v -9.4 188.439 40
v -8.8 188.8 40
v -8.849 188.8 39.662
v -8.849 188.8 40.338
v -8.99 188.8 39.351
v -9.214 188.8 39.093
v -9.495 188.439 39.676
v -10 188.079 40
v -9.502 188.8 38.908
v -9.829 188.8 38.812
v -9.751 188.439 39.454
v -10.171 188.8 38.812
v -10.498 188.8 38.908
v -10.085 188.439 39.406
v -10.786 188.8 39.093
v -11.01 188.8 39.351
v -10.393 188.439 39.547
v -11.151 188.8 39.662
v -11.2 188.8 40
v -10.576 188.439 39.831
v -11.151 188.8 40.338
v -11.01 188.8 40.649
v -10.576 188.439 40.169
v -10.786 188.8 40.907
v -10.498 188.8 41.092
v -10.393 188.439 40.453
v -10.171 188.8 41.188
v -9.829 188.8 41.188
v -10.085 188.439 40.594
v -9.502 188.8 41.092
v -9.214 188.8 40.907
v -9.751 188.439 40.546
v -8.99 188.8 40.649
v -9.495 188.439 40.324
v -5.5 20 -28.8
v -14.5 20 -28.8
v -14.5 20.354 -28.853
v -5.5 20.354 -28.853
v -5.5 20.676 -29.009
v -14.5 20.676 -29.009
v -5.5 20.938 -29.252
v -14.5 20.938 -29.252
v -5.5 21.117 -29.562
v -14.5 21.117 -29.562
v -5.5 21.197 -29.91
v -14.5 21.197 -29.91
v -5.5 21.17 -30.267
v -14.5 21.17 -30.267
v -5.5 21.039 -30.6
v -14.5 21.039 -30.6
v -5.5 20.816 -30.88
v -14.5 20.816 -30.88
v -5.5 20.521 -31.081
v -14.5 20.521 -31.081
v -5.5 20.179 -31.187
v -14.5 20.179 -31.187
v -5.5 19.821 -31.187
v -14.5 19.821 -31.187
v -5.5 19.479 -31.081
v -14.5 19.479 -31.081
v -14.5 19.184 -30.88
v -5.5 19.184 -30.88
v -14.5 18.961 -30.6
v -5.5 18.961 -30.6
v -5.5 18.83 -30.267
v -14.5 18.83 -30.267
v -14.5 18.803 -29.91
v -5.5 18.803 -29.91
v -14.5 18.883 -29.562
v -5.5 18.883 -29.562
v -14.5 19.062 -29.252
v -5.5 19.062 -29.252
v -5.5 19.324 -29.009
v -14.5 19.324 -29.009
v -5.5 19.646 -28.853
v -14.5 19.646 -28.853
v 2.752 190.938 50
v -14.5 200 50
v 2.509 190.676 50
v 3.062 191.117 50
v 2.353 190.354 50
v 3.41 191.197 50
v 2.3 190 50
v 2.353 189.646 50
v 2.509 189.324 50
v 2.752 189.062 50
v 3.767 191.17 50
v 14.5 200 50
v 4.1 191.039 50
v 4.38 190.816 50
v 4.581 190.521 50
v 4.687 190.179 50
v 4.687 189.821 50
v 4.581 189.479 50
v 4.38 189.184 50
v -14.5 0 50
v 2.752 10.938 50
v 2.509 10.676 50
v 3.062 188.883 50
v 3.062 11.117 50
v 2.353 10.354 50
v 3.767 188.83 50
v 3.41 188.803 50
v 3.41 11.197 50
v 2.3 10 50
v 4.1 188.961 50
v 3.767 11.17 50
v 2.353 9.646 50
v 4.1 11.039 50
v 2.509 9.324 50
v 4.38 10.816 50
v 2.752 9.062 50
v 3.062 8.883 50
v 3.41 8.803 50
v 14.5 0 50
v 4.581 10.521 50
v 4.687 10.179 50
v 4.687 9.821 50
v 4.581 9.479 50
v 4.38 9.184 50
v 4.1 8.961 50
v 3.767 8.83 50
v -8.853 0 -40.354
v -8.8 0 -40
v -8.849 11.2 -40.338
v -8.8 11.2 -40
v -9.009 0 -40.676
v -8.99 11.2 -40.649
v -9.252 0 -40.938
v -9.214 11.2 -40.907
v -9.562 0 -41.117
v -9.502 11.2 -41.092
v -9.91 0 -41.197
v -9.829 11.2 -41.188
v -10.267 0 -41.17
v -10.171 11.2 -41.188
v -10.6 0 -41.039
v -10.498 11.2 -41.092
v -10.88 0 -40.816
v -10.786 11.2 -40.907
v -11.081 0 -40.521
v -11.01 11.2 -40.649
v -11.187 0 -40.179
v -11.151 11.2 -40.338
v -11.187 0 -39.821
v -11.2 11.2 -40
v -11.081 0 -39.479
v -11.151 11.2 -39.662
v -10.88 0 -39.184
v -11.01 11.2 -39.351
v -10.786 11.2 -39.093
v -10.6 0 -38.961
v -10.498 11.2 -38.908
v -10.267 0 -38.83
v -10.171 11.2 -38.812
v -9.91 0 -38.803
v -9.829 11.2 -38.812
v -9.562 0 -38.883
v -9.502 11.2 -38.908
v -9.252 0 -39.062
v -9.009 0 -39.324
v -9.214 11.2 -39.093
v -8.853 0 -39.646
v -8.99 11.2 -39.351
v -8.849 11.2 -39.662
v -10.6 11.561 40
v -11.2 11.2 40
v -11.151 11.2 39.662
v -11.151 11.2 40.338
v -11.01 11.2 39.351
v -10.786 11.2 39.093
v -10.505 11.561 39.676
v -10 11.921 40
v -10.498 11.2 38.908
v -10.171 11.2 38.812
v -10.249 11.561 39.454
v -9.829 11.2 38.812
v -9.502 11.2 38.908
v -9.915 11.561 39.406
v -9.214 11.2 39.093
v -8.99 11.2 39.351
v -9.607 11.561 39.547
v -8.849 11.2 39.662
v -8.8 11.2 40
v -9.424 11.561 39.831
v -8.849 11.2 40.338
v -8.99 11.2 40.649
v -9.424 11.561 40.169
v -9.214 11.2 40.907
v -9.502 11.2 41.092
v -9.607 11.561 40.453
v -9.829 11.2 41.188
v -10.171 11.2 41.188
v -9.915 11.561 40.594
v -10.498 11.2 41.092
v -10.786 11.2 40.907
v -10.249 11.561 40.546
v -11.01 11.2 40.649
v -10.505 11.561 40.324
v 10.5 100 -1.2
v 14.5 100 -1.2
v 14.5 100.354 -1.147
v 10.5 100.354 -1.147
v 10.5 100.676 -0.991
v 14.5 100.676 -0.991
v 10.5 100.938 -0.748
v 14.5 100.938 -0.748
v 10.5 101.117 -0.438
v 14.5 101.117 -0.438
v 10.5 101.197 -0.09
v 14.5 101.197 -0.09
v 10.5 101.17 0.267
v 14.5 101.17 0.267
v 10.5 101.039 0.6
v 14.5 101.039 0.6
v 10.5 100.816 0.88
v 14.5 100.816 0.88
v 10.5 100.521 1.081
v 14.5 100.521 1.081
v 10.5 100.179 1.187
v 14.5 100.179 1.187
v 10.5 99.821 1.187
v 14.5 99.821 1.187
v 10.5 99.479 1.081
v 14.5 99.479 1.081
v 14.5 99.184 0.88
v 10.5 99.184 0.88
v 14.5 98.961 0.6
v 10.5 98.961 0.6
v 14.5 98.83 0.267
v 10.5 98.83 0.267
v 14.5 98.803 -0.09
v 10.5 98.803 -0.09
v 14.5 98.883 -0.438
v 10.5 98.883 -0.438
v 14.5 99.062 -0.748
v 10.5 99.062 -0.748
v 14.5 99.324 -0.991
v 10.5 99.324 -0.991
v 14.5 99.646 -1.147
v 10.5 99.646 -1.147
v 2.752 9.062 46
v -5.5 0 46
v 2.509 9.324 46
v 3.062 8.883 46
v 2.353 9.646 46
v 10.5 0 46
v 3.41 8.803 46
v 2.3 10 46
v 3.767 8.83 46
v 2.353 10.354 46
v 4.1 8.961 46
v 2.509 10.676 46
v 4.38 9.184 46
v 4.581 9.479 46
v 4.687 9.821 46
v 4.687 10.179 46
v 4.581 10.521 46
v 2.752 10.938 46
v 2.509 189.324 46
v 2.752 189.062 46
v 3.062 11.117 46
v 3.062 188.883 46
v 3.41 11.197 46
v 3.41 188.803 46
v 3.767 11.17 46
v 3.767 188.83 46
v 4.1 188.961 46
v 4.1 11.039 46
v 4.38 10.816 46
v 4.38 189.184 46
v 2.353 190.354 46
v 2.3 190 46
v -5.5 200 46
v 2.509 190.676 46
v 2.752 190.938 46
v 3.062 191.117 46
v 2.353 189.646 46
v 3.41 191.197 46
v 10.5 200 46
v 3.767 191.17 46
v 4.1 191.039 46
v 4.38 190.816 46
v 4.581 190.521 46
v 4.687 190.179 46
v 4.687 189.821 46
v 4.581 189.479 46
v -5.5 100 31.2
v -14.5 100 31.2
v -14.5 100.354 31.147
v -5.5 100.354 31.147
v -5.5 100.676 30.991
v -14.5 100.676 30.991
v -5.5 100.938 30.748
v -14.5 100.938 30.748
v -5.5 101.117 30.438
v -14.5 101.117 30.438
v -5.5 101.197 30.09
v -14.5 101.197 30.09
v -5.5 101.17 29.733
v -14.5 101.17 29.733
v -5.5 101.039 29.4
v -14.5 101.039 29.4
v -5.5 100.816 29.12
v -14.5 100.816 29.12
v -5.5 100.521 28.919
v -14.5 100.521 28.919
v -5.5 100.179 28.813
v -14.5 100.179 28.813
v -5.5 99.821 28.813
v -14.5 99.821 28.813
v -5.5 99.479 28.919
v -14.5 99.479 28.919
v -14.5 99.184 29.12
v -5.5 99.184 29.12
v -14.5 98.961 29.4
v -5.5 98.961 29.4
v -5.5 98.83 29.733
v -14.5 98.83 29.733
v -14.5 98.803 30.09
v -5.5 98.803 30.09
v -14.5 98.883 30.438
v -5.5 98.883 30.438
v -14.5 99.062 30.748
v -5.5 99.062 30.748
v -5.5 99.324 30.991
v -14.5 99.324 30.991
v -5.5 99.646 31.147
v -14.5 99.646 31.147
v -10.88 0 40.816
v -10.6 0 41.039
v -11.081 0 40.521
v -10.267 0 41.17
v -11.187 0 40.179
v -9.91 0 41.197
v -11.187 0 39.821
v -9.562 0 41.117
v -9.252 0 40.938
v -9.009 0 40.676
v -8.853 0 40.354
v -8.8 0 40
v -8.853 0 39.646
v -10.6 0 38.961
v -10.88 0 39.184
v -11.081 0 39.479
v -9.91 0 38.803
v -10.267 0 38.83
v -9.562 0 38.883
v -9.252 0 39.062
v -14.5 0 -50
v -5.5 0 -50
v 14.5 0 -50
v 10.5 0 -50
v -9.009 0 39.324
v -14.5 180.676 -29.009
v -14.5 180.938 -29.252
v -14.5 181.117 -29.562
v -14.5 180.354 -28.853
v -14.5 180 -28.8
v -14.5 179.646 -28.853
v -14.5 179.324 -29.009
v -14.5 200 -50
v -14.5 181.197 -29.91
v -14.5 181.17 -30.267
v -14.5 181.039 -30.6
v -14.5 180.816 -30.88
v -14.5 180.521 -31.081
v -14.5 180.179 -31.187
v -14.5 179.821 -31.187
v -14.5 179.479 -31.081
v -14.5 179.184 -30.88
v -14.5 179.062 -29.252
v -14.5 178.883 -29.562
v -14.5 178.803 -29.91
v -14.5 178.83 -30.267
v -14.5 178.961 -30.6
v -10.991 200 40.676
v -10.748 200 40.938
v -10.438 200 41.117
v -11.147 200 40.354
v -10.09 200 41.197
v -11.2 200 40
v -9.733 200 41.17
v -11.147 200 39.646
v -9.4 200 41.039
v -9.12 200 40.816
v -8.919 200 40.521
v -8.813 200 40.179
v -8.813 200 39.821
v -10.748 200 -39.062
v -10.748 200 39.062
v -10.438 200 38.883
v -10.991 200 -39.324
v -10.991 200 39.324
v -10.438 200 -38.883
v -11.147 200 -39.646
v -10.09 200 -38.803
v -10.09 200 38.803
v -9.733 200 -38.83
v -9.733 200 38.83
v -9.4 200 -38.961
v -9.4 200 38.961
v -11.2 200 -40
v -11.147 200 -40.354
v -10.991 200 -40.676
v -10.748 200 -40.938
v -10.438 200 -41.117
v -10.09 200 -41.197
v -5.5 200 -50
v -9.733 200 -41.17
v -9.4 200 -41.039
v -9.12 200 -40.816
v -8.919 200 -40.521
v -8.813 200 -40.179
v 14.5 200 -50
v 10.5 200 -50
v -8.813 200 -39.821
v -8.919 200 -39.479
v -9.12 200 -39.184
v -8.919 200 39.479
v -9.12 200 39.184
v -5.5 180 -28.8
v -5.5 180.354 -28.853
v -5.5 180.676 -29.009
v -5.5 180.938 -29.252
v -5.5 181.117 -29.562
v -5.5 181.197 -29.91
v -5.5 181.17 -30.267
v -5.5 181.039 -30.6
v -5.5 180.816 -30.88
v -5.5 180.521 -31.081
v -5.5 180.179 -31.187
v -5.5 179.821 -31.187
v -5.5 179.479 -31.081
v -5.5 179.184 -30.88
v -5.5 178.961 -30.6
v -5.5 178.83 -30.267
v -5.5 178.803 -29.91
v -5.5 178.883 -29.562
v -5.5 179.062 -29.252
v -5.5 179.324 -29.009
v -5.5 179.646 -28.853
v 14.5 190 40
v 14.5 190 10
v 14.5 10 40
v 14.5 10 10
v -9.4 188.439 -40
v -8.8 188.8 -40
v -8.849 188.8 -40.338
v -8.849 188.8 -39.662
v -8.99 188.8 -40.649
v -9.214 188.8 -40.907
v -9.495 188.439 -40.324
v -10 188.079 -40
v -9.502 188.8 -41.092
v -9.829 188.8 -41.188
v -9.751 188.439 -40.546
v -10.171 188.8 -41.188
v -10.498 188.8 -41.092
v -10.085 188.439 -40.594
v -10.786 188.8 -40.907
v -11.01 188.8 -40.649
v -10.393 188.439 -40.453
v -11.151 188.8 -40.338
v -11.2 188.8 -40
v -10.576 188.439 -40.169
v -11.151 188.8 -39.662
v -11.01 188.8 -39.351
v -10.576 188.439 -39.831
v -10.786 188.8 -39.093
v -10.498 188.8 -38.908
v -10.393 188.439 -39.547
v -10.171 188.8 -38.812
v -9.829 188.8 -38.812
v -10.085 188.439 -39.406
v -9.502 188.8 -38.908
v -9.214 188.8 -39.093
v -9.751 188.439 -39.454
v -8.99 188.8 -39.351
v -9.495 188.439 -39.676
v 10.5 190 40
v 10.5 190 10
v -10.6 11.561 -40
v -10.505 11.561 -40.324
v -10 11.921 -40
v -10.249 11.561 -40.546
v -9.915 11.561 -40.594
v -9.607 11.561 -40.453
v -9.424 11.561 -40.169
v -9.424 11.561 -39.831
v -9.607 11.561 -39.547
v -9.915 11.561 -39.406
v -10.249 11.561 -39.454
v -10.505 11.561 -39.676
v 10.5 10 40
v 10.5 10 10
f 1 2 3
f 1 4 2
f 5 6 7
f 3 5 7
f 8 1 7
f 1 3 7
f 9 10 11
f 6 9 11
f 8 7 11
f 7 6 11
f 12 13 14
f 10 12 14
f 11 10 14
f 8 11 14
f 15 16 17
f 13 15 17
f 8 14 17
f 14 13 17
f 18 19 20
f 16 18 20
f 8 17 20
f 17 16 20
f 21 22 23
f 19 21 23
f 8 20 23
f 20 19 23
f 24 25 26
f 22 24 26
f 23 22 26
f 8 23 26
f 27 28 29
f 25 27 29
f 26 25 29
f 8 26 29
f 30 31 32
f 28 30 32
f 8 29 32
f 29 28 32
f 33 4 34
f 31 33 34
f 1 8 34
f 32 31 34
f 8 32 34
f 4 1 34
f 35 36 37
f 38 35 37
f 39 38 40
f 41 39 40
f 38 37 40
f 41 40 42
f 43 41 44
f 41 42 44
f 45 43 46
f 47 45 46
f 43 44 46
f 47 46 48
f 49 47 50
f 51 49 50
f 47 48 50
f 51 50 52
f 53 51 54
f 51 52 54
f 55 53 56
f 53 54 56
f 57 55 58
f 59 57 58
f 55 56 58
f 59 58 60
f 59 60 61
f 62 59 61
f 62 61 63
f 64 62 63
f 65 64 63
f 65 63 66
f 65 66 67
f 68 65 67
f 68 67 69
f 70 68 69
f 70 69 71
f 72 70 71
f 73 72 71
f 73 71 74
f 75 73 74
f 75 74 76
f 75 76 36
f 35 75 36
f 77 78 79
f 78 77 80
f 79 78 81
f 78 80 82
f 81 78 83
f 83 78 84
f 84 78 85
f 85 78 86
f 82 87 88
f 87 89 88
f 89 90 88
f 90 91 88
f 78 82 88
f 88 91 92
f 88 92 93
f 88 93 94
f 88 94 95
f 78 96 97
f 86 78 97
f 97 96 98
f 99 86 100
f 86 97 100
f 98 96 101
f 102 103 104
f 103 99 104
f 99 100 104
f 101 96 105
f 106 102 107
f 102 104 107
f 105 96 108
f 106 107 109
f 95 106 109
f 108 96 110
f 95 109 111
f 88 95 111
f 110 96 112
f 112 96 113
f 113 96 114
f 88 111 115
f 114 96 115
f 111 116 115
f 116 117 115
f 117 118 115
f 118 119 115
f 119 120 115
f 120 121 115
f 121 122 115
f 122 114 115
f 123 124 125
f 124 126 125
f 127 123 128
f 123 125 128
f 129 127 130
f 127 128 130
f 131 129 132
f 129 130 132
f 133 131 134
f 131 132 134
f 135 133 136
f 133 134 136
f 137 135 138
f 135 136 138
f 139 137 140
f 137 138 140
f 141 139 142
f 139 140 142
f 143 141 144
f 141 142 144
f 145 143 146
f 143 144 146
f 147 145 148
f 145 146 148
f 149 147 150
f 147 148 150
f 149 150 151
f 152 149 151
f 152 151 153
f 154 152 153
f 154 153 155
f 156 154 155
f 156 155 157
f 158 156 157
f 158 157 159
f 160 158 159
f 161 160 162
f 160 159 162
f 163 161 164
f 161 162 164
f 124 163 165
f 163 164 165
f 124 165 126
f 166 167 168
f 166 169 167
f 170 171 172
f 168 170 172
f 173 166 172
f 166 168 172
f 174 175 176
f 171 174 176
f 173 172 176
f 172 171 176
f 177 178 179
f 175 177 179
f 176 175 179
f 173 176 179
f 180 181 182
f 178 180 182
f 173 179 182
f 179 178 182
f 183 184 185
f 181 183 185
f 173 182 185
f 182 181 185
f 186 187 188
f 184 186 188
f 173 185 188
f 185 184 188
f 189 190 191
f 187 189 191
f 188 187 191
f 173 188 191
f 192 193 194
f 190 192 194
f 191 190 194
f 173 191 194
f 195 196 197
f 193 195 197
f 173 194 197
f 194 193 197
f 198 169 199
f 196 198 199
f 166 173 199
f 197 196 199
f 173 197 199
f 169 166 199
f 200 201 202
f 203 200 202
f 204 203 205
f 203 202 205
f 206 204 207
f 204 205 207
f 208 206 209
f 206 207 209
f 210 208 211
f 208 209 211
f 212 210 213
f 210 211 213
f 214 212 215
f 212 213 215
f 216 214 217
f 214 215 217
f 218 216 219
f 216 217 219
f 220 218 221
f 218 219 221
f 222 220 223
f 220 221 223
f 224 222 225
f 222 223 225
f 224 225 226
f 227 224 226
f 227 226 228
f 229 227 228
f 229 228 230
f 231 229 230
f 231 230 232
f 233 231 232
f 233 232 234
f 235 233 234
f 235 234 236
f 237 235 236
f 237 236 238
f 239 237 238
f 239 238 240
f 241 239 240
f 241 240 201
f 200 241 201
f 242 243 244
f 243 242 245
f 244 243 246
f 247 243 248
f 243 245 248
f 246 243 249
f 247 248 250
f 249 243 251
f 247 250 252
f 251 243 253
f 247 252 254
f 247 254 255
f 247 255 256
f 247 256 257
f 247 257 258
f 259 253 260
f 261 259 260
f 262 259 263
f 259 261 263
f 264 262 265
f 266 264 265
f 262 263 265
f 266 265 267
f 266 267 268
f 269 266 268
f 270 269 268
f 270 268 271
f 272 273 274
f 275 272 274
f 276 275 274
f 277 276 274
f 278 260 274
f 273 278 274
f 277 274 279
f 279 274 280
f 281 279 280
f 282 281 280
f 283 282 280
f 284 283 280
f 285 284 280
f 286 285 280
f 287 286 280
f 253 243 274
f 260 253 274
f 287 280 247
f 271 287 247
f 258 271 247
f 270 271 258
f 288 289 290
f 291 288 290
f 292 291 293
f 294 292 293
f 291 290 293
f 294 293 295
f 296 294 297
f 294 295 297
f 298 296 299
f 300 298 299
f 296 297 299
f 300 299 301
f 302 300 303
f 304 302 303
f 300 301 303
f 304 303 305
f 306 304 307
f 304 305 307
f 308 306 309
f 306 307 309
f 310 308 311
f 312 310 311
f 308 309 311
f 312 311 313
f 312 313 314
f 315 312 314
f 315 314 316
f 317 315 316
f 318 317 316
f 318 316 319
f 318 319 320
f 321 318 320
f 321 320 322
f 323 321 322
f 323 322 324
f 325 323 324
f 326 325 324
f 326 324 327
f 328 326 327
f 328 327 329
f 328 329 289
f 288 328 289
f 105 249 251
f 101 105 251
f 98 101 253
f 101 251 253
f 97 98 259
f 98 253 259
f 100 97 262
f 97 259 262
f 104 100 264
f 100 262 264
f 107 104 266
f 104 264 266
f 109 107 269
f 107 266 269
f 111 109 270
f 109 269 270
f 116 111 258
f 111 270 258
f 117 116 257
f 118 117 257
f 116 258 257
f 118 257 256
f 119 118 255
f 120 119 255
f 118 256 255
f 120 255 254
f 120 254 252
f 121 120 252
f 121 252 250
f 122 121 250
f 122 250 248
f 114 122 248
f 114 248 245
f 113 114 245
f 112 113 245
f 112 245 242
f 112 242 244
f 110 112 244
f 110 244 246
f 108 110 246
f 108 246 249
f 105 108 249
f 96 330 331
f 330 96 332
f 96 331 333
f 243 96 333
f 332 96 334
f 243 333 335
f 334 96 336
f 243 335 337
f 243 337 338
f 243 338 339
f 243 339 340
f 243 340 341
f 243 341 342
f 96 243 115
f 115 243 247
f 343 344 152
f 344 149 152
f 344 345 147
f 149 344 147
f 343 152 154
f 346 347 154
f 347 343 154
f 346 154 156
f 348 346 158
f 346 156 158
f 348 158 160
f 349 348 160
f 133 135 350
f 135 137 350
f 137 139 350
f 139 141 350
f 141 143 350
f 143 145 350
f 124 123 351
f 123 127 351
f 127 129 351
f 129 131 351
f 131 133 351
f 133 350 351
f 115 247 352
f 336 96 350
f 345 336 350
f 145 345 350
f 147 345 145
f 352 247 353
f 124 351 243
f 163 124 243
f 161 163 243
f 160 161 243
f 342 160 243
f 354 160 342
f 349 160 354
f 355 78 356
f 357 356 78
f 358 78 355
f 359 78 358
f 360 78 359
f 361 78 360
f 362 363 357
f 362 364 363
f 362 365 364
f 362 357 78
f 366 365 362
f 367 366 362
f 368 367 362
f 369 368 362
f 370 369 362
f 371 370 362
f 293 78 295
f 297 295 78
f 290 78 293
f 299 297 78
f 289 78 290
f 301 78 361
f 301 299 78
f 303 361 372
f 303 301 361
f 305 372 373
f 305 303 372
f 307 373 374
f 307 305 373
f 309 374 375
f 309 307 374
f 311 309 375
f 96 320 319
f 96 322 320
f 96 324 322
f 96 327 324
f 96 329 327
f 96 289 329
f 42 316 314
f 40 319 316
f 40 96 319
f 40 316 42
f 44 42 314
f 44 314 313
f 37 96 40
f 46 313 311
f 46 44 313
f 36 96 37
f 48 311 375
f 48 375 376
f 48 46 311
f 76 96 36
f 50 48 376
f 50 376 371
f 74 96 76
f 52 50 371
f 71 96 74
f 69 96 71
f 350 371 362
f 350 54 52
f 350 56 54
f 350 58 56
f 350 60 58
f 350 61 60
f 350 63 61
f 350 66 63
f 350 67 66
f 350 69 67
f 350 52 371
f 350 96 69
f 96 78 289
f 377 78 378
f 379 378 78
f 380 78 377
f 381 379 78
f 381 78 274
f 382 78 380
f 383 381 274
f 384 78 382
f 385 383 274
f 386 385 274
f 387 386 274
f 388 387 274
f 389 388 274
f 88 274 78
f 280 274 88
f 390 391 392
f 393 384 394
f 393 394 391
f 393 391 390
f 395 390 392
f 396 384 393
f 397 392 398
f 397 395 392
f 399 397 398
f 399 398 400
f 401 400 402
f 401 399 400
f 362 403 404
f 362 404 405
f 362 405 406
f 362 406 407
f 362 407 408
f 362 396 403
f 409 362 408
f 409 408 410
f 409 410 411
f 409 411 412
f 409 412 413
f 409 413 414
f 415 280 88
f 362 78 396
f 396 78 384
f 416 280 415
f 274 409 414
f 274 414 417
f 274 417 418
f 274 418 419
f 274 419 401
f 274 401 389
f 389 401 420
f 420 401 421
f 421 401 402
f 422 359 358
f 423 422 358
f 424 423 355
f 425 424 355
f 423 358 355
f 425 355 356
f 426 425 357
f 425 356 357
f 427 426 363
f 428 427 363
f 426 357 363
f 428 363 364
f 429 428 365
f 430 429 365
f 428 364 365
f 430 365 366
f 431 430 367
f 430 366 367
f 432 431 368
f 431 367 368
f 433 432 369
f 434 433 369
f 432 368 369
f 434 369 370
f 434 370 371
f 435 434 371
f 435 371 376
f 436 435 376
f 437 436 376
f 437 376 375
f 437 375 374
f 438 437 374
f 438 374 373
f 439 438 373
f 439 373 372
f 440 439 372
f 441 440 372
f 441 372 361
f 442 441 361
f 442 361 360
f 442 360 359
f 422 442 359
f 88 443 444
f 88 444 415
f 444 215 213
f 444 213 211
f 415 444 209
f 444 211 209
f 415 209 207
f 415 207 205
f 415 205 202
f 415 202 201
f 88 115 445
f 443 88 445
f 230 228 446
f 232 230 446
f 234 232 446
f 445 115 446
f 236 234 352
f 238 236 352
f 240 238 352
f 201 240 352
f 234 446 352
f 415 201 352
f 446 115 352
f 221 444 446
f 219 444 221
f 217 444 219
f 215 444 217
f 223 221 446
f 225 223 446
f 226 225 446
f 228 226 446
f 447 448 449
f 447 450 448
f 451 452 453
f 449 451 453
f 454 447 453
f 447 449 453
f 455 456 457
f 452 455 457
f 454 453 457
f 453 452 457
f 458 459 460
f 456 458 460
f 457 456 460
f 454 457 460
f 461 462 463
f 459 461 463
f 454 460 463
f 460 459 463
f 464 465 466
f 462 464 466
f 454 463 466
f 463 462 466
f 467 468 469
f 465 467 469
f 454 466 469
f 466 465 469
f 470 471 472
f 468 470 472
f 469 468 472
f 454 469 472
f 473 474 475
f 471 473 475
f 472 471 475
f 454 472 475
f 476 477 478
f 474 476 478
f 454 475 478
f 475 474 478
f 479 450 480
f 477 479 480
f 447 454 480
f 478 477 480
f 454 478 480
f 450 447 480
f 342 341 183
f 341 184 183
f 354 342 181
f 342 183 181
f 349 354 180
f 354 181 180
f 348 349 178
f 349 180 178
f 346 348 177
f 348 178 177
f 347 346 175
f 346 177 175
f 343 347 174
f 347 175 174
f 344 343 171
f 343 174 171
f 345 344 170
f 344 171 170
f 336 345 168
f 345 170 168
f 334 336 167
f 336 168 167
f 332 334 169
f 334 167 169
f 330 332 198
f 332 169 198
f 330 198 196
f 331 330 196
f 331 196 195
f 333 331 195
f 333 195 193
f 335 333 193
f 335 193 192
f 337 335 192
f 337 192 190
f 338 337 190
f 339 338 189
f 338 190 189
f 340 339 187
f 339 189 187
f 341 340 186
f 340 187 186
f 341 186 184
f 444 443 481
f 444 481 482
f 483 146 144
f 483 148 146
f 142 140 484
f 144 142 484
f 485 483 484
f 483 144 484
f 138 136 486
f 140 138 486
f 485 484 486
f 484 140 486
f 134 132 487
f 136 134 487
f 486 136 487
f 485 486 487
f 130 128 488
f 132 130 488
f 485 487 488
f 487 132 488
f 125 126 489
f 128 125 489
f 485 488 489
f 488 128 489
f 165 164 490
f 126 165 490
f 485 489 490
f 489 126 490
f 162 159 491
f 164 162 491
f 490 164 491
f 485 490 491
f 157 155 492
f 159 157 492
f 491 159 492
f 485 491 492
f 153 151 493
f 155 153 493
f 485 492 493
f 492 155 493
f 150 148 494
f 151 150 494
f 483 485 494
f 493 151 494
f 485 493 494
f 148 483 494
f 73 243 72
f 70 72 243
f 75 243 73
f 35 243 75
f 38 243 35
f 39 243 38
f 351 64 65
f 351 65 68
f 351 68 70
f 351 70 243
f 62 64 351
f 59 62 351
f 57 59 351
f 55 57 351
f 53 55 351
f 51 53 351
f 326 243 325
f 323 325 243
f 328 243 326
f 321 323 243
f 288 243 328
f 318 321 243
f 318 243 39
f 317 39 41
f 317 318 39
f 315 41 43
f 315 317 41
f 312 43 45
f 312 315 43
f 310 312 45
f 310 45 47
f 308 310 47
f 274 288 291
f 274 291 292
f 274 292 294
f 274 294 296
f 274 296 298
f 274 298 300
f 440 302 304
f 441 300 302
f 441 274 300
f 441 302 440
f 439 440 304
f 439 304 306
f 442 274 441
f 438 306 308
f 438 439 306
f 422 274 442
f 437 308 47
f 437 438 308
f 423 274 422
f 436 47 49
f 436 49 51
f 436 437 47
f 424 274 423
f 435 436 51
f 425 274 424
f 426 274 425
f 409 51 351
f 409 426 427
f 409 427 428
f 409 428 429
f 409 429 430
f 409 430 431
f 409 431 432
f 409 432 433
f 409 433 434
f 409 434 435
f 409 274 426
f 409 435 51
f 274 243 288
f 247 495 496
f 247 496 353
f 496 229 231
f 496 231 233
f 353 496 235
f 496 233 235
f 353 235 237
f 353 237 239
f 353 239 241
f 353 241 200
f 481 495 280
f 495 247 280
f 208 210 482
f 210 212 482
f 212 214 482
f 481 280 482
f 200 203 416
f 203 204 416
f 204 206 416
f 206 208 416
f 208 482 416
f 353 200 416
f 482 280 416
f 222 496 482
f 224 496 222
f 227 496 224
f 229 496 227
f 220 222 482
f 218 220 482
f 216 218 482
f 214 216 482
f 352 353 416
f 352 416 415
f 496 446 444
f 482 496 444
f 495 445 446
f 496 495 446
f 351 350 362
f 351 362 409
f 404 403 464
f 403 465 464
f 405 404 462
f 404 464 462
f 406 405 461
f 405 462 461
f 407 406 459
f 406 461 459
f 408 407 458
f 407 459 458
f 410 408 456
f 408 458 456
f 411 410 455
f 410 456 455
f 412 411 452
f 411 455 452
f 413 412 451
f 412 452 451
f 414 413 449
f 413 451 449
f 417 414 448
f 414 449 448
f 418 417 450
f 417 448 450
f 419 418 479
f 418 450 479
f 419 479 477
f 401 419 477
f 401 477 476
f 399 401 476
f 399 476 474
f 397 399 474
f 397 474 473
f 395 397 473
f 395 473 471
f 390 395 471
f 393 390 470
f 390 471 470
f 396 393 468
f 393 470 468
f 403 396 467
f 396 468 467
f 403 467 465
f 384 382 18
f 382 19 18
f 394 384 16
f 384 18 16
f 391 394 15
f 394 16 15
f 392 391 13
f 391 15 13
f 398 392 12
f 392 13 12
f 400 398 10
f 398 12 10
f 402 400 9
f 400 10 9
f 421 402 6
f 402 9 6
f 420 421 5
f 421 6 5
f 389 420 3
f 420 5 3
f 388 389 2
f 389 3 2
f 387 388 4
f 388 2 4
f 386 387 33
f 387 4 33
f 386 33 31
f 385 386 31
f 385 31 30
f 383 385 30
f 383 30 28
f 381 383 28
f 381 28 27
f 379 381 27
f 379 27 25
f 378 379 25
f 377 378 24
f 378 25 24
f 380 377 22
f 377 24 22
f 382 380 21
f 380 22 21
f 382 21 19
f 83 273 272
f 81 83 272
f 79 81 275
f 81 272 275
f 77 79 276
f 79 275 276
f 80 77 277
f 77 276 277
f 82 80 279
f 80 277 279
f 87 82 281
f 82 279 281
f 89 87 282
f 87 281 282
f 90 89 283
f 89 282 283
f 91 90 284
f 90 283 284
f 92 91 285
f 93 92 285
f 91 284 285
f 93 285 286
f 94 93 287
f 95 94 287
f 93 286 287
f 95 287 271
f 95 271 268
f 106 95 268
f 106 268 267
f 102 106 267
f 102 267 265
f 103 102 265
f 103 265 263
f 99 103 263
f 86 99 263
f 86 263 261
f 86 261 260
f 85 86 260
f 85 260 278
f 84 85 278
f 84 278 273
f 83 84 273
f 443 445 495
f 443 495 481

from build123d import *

# Parameters (mm, degrees)
SKETCH1_W                 = 29
SKETCH1_H                 = 100
BOSS_EXTRUDE1_DEPTH       = 200
SKETCH2_W                 = 16
SKETCH2_H                 = 96
CUT_EXTRUDE1_DEPTH        = 207.664583323
SKETCH3_W                 = 30
SKETCH3_H                 = 180
CUT_EXTRUDE2_DEPTH        = 4
M2_CLEARANCE_HOLE1_D      = 2.4
M2_CLEARANCE_HOLE1_DEPTH  = 11.2
M2_CLEARANCE_HOLE1_TIP    = 0.721032743
M2_CLEARANCE_HOLE2_D      = 2.4
M2_CLEARANCE_HOLE2_DEPTH  = 11.2
M2_CLEARANCE_HOLE2_TIP    = 0.721032743
M2_CLEARANCE_HOLE3_REACH  = 210.185
M2_CLEARANCE_HOLE3_BORE_R = 1.2
M2_CLEARANCE_HOLE4_REACH  = 210.185
M2_CLEARANCE_HOLE4_BORE_R = 1.2
M2_CLEARANCE_HOLE5_D      = 2.4


with BuildPart() as part:
    # Sketch1 → Boss-Extrude1 (new body)
    with BuildSketch(Plane(origin=(0, 0, 0), x_dir=(1, 0, 0), z_dir=(0, 1, 0))):
        Rectangle(SKETCH1_W, SKETCH1_H)
    extrude(amount=BOSS_EXTRUDE1_DEPTH)

    # Sketch2 → Cut-Extrude1 (cut, through all)
    with BuildSketch(Plane(origin=(0, 200, 0), x_dir=(1, 0, 0), z_dir=(0, 1, 0))):
        with Locations((2.5, 2)):
            Rectangle(SKETCH2_W, SKETCH2_H)
    extrude(amount=-CUT_EXTRUDE1_DEPTH, mode=Mode.SUBTRACT)

    # Sketch3 → Cut-Extrude2 (cut)
    with BuildSketch(Plane(origin=(14.5, 0, 0), x_dir=(0, 0, -1), z_dir=(1, 0, 0))):
        with Locations((-25, 100)):
            Rectangle(SKETCH3_W, SKETCH3_H)
    extrude(amount=-CUT_EXTRUDE2_DEPTH, mode=Mode.SUBTRACT)

    # M2 Clearance Hole1
    with Locations(Plane(origin=(0, 200, 0), x_dir=(1, 0, 0), z_dir=(0, 1, 0))):
        with Locations((-10, 40), (-10, -40)):
            Hole(M2_CLEARANCE_HOLE1_D / 2, depth=M2_CLEARANCE_HOLE1_DEPTH)
            with Locations((0, 0, -(M2_CLEARANCE_HOLE1_DEPTH + M2_CLEARANCE_HOLE1_TIP / 2))):  # 118° drill point
                Cone(0, M2_CLEARANCE_HOLE1_D / 2, M2_CLEARANCE_HOLE1_TIP, mode=Mode.SUBTRACT)

    # M2 Clearance Hole2
    with Locations(Plane(origin=(0, 0, 0), x_dir=(-1, 0, 0), z_dir=(0, -1, 0))):
        with Locations((10, 40), (10, -40)):
            Hole(M2_CLEARANCE_HOLE2_D / 2, depth=M2_CLEARANCE_HOLE2_DEPTH)
            with Locations((0, 0, -(M2_CLEARANCE_HOLE2_DEPTH + M2_CLEARANCE_HOLE2_TIP / 2))):  # 118° drill point
                Cone(0, M2_CLEARANCE_HOLE2_D / 2, M2_CLEARANCE_HOLE2_TIP, mode=Mode.SUBTRACT)

    # M2 Clearance Hole3 bore → M2 Clearance Hole3 (cut, up to next)
    with BuildSketch(Plane.ZY.offset(14.5), mode=Mode.PRIVATE) as m2_clearance_hole3_sk1:
        with Locations((-30, 180)):
            Circle(M2_CLEARANCE_HOLE3_BORE_R)
    m2_clearance_hole3_tool1 = extrude(m2_clearance_hole3_sk1.sketch, amount=-M2_CLEARANCE_HOLE3_REACH, mode=Mode.PRIVATE) & part.part
    # M2 Clearance Hole3 bore → M2 Clearance Hole3 (cut, up to next)
    with BuildSketch(Plane.ZY.offset(14.5), mode=Mode.PRIVATE) as m2_clearance_hole3_sk2:
        with Locations((-30, 20)):
            Circle(M2_CLEARANCE_HOLE3_BORE_R)
    m2_clearance_hole3_tool2 = extrude(m2_clearance_hole3_sk2.sketch, amount=-M2_CLEARANCE_HOLE3_REACH, mode=Mode.PRIVATE) & part.part
    # M2 Clearance Hole3 bore → M2 Clearance Hole3 (cut, up to next)
    with BuildSketch(Plane.ZY.offset(14.5), mode=Mode.PRIVATE) as m2_clearance_hole3_sk3:
        with Locations((30, 100)):
            Circle(M2_CLEARANCE_HOLE3_BORE_R)
    m2_clearance_hole3_tool3 = extrude(m2_clearance_hole3_sk3.sketch, amount=-M2_CLEARANCE_HOLE3_REACH, mode=Mode.PRIVATE) & part.part
    add(m2_clearance_hole3_tool1.solids().sort_by_distance((-14.5, 180, -30))[0], mode=Mode.SUBTRACT)
    add(m2_clearance_hole3_tool2.solids().sort_by_distance((-14.5, 20, -30))[0], mode=Mode.SUBTRACT)
    add(m2_clearance_hole3_tool3.solids().sort_by_distance((-14.5, 100, 30))[0], mode=Mode.SUBTRACT)

    # M2 Clearance Hole4 bore → M2 Clearance Hole4 (cut, up to next)
    with BuildSketch(Plane(origin=(14.5, 0, 0), x_dir=(0, 0, -1), z_dir=(1, 0, 0)), mode=Mode.PRIVATE) as m2_clearance_hole4_sk1:
        with Locations((0, 100)):
            Circle(M2_CLEARANCE_HOLE4_BORE_R)
    m2_clearance_hole4_tool1 = extrude(m2_clearance_hole4_sk1.sketch, amount=-M2_CLEARANCE_HOLE4_REACH, mode=Mode.PRIVATE) & part.part
    add(m2_clearance_hole4_tool1.solids().sort_by_distance((14.5, 100, 0))[0], mode=Mode.SUBTRACT)

    # M2 Clearance Hole5 (through all)
    with Locations(Plane.XY.offset(50)):
        with Locations((3.5, 10), (3.5, 190)):
            Hole(M2_CLEARANCE_HOLE5_D / 2)


solid = part.part
